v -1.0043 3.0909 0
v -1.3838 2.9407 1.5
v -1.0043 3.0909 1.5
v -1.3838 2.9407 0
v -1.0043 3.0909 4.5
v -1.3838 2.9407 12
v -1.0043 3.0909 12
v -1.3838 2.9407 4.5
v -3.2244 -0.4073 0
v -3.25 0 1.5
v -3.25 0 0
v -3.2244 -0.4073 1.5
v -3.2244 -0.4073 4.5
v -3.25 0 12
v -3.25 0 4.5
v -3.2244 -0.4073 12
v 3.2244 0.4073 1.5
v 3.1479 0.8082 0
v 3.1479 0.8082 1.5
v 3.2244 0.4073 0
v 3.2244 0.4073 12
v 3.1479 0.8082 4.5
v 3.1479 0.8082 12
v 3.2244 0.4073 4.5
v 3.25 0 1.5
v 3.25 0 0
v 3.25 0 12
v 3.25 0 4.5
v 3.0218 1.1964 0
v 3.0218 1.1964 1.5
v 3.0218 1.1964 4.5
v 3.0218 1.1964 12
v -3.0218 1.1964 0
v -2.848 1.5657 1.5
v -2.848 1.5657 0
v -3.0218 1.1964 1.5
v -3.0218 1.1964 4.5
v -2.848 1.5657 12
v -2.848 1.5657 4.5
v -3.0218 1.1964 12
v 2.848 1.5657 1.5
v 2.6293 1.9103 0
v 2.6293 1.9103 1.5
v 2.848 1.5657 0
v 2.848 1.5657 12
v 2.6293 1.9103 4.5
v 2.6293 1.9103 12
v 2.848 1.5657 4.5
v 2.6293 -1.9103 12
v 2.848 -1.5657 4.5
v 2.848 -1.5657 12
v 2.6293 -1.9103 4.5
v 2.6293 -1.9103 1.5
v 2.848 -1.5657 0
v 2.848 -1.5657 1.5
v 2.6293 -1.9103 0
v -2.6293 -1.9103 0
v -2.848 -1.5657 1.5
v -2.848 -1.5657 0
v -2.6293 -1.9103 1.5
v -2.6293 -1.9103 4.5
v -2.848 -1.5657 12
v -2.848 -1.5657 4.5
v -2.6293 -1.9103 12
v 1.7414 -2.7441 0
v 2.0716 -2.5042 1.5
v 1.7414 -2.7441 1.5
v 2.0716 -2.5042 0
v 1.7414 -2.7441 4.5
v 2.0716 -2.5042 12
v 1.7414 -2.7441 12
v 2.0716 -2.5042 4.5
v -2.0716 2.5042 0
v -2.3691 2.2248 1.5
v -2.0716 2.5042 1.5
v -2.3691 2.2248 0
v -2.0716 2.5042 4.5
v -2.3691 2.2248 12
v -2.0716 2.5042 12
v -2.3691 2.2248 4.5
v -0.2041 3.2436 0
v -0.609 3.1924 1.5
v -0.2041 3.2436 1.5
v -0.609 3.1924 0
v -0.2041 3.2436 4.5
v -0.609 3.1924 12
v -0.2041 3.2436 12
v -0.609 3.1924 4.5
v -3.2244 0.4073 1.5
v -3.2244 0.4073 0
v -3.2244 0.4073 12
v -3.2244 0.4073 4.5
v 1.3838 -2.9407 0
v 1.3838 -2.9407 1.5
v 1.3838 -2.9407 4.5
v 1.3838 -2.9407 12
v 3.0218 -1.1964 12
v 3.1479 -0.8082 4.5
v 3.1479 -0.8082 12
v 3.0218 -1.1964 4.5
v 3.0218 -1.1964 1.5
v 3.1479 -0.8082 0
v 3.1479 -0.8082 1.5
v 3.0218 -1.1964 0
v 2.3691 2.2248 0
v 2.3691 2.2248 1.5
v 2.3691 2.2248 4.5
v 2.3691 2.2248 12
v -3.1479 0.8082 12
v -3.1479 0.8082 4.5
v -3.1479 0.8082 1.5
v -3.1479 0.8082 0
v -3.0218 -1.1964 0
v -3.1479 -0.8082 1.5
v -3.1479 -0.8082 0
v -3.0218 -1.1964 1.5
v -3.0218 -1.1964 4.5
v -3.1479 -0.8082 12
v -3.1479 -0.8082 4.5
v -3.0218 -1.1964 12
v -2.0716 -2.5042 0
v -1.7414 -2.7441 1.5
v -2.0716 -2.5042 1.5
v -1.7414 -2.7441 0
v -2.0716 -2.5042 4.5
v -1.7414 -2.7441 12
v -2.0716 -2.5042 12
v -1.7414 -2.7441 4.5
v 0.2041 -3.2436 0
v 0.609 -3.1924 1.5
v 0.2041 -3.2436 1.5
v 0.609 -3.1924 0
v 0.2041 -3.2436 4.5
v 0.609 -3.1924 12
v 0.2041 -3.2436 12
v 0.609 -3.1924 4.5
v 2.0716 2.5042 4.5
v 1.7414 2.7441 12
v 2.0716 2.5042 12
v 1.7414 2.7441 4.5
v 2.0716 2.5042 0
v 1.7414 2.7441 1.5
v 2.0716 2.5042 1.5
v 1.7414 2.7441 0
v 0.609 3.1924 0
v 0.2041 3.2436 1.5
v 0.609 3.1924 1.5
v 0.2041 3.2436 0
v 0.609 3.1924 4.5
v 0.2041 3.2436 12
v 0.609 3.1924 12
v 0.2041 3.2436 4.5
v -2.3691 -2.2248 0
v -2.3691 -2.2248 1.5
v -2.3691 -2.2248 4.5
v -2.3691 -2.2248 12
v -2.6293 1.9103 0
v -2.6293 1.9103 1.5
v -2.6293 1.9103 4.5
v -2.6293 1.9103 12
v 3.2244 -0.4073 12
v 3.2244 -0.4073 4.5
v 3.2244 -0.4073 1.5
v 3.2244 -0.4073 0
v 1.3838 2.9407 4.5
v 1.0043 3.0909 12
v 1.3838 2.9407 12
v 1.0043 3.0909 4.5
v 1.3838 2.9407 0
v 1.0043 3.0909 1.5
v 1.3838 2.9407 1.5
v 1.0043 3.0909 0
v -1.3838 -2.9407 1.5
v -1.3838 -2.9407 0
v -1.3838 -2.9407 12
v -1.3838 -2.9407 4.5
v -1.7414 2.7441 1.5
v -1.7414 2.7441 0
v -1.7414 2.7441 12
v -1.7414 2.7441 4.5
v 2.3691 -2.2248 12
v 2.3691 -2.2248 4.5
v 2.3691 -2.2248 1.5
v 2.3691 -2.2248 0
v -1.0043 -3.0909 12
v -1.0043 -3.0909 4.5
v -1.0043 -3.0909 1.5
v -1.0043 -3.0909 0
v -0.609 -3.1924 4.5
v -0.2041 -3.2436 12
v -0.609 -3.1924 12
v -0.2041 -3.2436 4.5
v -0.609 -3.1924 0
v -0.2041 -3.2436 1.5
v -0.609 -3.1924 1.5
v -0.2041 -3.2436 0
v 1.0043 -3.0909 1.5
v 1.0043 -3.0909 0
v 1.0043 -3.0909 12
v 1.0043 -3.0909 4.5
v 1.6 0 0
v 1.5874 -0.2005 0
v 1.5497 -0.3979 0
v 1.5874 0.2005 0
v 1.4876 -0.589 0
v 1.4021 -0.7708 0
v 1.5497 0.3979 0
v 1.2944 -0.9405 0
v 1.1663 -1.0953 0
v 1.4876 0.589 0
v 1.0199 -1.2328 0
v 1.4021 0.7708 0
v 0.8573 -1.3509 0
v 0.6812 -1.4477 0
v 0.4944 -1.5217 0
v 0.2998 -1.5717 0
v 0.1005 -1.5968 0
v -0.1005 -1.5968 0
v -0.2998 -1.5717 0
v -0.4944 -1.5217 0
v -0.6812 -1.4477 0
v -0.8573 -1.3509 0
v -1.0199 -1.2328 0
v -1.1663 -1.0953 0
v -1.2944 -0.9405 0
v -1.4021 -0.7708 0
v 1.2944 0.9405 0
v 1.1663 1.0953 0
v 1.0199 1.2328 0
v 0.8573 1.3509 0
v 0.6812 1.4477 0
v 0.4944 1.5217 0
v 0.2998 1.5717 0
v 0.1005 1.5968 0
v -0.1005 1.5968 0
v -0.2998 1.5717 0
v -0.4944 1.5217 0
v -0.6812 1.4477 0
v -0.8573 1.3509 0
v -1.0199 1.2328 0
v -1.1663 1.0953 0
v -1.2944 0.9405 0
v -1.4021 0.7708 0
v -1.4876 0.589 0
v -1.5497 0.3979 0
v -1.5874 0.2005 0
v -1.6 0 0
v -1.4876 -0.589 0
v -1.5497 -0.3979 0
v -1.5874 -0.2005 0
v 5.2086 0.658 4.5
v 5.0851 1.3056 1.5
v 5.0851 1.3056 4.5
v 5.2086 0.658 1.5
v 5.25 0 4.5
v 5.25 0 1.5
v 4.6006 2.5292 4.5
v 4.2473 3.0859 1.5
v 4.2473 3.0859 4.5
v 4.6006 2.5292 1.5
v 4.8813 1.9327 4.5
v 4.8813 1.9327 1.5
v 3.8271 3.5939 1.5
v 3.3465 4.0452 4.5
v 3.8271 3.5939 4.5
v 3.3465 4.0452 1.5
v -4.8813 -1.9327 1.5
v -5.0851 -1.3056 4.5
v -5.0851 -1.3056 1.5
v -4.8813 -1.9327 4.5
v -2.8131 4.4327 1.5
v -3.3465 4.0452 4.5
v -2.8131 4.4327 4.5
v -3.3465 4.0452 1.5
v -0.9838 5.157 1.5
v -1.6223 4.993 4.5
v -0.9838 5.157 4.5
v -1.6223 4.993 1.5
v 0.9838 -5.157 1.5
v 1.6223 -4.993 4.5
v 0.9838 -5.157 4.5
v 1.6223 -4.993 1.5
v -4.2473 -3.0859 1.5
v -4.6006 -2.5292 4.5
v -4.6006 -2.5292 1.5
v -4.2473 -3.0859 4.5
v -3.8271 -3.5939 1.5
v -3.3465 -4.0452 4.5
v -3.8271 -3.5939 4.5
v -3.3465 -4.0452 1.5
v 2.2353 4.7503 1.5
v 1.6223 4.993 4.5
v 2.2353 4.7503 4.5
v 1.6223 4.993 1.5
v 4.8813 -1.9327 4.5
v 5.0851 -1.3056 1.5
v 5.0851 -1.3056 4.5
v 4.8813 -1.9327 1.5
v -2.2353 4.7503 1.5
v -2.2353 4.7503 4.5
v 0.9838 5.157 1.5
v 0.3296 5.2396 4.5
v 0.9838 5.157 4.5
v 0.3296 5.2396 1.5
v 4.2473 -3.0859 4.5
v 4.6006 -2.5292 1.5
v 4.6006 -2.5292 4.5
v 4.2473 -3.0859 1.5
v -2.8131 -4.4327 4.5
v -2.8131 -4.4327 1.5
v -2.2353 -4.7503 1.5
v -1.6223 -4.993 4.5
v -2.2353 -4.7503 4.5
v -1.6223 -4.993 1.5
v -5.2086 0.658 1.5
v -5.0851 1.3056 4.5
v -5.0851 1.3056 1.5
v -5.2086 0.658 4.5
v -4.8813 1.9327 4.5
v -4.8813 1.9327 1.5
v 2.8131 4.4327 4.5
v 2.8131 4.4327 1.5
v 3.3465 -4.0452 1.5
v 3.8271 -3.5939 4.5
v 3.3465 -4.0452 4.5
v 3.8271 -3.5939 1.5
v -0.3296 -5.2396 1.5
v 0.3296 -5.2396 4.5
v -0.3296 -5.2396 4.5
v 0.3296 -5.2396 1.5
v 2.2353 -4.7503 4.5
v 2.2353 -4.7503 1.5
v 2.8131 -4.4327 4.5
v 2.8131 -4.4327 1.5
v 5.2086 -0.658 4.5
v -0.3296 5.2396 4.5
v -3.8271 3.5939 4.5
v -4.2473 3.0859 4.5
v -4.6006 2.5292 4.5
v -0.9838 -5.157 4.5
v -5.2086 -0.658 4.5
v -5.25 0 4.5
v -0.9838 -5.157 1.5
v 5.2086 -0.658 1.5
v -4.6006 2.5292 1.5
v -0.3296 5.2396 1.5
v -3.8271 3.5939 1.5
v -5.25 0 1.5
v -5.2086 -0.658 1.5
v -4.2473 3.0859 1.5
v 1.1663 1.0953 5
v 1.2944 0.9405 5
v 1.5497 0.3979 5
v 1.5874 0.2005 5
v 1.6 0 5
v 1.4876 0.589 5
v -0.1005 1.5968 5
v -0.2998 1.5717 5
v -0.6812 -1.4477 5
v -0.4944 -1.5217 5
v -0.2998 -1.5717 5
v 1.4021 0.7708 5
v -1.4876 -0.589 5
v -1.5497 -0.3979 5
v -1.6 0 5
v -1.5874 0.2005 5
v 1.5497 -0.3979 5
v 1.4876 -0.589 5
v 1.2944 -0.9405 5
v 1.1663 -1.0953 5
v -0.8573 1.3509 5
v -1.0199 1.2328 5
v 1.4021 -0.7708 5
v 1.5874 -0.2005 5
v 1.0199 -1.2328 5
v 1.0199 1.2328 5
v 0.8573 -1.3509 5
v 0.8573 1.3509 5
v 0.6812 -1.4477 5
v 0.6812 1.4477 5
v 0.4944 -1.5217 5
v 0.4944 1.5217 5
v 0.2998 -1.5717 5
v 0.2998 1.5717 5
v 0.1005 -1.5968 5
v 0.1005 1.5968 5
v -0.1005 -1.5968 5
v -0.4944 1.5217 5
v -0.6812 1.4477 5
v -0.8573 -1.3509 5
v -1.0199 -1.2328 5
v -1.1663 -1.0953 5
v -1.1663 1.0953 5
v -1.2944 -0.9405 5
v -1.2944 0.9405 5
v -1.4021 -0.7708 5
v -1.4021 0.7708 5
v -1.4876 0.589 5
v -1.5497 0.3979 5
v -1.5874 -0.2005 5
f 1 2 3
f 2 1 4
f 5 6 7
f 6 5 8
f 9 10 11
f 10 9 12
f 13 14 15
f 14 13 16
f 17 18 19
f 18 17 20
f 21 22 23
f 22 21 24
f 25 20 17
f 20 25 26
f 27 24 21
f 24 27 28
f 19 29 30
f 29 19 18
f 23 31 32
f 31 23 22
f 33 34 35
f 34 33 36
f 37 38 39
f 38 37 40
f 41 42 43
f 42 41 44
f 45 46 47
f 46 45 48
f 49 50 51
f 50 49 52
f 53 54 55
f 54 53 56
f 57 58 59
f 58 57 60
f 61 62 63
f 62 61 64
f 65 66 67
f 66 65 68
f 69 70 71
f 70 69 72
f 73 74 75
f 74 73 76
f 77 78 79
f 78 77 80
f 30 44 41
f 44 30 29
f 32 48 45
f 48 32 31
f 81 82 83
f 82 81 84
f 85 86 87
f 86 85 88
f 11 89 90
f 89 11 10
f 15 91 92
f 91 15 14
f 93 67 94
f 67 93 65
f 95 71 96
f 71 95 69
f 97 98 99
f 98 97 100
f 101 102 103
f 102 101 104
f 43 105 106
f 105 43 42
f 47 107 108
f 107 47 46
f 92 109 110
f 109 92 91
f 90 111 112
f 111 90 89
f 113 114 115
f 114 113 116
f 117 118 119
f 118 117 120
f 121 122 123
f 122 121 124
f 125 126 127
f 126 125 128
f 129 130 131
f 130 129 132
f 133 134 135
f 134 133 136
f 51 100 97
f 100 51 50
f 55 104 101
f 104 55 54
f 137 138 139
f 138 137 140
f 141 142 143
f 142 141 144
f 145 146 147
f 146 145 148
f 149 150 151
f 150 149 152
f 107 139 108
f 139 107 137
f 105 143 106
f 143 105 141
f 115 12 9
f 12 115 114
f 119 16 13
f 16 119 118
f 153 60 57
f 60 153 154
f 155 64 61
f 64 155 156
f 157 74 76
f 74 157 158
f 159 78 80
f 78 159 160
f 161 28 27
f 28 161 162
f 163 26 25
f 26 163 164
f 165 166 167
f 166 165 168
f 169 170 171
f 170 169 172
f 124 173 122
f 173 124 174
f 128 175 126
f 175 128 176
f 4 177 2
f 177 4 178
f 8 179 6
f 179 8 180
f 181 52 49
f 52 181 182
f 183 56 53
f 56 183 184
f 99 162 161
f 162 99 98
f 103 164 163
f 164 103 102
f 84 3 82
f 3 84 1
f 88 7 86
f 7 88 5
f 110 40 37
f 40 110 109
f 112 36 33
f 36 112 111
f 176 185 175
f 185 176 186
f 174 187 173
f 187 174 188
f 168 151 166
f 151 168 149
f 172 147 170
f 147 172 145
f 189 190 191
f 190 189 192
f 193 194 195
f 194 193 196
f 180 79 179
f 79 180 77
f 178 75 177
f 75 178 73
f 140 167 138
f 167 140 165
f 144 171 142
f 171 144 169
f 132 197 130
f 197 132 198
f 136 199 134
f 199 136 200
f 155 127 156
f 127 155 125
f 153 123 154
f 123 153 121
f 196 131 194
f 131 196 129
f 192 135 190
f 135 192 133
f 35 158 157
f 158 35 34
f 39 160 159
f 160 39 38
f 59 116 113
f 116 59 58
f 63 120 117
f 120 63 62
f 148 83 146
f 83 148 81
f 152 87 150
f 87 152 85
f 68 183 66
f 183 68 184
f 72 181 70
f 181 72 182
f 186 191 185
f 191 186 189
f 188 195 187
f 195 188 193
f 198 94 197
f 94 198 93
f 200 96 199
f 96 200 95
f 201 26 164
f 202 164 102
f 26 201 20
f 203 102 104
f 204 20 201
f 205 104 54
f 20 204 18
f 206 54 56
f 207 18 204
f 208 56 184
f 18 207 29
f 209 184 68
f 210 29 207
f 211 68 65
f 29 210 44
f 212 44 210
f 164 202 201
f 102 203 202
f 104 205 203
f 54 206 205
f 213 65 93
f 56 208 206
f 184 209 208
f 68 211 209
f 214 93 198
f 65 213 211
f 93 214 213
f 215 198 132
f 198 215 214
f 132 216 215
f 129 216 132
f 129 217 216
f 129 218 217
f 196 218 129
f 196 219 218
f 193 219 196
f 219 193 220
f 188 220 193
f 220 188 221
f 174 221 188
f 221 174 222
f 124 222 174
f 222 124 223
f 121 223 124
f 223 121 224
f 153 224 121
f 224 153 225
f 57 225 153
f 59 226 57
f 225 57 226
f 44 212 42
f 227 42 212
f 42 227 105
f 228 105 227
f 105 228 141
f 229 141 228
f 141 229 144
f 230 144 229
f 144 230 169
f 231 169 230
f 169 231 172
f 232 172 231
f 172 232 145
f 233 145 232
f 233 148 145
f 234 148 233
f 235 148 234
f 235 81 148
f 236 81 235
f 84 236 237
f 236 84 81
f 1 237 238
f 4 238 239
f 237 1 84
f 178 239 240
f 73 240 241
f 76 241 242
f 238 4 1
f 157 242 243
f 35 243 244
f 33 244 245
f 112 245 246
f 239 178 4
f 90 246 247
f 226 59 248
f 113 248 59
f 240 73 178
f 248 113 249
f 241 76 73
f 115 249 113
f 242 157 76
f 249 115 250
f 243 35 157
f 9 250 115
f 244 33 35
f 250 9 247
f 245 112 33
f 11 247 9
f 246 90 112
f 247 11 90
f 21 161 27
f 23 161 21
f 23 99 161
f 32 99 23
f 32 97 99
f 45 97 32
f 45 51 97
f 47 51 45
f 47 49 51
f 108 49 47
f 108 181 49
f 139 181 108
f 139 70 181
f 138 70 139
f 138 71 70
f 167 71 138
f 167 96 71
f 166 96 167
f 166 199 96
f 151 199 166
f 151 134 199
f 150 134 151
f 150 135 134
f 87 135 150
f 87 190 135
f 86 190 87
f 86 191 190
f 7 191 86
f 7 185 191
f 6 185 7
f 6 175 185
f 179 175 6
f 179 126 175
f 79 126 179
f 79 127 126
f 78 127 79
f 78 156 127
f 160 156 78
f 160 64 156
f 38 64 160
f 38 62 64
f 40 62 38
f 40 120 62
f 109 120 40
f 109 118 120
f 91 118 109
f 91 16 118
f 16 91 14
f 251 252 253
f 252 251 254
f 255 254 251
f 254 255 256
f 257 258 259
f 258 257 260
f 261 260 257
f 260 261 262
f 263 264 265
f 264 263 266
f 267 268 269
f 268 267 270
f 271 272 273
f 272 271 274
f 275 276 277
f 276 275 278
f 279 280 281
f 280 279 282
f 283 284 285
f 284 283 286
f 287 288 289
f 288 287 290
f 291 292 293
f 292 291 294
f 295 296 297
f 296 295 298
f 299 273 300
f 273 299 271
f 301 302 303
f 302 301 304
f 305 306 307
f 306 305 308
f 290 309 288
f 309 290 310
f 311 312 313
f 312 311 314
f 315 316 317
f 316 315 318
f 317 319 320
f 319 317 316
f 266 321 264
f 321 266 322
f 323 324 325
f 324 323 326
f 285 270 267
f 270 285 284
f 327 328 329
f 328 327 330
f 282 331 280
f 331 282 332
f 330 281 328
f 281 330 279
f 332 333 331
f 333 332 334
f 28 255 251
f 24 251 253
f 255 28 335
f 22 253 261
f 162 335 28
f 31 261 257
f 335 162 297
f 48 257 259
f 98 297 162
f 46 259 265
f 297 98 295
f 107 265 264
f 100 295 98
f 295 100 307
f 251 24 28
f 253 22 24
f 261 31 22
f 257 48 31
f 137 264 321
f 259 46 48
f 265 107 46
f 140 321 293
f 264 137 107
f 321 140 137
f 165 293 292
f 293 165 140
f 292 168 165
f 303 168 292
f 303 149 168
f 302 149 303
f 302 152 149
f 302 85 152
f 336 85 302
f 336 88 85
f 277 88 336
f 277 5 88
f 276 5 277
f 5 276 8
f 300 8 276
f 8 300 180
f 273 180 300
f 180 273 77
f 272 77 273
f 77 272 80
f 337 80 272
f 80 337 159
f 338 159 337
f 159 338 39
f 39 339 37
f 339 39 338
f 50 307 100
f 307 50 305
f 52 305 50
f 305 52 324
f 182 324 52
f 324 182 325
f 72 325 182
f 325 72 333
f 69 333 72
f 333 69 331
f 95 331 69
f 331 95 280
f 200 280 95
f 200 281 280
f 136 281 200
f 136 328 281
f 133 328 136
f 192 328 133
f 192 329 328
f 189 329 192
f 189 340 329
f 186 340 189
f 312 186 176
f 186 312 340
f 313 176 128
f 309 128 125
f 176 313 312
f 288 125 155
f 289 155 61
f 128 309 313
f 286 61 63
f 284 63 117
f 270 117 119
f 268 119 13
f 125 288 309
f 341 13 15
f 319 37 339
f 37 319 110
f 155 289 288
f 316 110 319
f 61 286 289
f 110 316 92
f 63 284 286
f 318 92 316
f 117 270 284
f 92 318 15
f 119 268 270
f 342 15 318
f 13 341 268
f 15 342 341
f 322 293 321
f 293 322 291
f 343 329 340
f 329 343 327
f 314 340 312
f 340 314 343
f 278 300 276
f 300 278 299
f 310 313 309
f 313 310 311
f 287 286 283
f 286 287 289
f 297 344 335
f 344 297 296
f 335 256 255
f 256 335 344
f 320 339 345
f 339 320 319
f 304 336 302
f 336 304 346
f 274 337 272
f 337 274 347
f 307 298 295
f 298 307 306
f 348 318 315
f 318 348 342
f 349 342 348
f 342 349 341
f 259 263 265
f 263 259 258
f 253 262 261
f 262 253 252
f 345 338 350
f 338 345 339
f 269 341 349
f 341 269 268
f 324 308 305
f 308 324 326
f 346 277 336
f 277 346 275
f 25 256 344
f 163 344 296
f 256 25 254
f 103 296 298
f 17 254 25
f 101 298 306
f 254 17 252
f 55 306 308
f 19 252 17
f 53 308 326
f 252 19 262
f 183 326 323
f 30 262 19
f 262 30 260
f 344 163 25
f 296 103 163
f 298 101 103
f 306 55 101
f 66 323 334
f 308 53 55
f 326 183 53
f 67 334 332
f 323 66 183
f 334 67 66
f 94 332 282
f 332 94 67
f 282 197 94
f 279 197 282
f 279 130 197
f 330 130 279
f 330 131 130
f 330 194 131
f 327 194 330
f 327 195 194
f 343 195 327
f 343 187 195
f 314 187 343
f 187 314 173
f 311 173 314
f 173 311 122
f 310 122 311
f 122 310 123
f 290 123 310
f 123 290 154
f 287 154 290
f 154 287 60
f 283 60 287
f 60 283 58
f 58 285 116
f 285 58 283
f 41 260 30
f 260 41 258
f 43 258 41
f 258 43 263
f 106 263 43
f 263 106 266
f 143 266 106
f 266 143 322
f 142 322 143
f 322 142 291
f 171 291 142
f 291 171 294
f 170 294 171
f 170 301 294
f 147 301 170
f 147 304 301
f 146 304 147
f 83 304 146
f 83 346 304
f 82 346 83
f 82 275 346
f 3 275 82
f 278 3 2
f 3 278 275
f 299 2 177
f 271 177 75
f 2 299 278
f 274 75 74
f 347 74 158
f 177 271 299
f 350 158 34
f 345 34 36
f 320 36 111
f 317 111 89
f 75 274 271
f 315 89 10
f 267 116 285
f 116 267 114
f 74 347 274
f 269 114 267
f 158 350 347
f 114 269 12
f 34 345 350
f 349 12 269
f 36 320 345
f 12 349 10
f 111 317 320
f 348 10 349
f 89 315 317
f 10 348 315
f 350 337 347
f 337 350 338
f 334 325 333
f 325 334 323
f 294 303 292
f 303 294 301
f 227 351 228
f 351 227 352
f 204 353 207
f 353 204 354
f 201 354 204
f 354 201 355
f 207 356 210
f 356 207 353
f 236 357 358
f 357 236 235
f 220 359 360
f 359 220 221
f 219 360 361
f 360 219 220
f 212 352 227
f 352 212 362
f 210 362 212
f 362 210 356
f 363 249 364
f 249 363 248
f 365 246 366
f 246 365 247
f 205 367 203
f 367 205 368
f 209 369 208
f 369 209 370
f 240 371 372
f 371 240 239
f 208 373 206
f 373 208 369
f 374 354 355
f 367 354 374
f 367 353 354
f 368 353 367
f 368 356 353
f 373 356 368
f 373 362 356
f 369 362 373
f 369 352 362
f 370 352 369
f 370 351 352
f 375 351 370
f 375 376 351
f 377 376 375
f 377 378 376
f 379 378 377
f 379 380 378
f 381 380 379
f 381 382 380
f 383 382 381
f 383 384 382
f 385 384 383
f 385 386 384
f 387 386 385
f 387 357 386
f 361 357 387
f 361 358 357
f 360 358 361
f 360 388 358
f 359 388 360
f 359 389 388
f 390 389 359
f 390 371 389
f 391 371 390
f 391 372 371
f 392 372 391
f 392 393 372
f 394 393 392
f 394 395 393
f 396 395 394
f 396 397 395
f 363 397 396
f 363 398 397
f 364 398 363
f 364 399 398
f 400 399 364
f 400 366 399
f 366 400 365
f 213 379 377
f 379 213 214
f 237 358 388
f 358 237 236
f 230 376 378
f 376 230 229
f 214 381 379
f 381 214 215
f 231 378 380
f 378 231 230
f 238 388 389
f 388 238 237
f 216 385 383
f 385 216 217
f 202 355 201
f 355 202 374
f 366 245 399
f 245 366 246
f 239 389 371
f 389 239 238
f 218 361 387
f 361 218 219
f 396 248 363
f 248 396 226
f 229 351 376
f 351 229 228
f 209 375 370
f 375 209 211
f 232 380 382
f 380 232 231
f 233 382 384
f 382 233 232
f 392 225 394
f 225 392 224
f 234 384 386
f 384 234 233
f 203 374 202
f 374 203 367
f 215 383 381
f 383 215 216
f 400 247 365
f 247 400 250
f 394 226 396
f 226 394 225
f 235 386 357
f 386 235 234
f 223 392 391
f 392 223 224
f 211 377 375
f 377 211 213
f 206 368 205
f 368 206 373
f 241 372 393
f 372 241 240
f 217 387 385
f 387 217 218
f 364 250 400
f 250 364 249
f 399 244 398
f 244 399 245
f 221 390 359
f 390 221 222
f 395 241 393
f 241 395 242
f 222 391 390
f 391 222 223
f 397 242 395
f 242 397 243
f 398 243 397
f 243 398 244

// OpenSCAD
$fn = 50;
button_h = 13;
overlap = 5;
total_height = 20;
th = 2; // enclosure thickness
eps = 1e-1;

cap_r = 6.5 / 2;
cap_h = total_height - button_h + overlap;

border_offset = 5.5 + th;
border_h = 3;
border_r = cap_r + 2;

socket_r = 3.2 / 2;

difference() {
  union() {
    cylinder(r=cap_r, h=cap_h);
    translate([0, 0, cap_h - border_h - border_offset]) {
      cylinder(r=border_r, h=border_h);
    }
  }
  translate([0, 0, -eps]) {
    cylinder(r=socket_r, h=overlap+eps);
  }
}
